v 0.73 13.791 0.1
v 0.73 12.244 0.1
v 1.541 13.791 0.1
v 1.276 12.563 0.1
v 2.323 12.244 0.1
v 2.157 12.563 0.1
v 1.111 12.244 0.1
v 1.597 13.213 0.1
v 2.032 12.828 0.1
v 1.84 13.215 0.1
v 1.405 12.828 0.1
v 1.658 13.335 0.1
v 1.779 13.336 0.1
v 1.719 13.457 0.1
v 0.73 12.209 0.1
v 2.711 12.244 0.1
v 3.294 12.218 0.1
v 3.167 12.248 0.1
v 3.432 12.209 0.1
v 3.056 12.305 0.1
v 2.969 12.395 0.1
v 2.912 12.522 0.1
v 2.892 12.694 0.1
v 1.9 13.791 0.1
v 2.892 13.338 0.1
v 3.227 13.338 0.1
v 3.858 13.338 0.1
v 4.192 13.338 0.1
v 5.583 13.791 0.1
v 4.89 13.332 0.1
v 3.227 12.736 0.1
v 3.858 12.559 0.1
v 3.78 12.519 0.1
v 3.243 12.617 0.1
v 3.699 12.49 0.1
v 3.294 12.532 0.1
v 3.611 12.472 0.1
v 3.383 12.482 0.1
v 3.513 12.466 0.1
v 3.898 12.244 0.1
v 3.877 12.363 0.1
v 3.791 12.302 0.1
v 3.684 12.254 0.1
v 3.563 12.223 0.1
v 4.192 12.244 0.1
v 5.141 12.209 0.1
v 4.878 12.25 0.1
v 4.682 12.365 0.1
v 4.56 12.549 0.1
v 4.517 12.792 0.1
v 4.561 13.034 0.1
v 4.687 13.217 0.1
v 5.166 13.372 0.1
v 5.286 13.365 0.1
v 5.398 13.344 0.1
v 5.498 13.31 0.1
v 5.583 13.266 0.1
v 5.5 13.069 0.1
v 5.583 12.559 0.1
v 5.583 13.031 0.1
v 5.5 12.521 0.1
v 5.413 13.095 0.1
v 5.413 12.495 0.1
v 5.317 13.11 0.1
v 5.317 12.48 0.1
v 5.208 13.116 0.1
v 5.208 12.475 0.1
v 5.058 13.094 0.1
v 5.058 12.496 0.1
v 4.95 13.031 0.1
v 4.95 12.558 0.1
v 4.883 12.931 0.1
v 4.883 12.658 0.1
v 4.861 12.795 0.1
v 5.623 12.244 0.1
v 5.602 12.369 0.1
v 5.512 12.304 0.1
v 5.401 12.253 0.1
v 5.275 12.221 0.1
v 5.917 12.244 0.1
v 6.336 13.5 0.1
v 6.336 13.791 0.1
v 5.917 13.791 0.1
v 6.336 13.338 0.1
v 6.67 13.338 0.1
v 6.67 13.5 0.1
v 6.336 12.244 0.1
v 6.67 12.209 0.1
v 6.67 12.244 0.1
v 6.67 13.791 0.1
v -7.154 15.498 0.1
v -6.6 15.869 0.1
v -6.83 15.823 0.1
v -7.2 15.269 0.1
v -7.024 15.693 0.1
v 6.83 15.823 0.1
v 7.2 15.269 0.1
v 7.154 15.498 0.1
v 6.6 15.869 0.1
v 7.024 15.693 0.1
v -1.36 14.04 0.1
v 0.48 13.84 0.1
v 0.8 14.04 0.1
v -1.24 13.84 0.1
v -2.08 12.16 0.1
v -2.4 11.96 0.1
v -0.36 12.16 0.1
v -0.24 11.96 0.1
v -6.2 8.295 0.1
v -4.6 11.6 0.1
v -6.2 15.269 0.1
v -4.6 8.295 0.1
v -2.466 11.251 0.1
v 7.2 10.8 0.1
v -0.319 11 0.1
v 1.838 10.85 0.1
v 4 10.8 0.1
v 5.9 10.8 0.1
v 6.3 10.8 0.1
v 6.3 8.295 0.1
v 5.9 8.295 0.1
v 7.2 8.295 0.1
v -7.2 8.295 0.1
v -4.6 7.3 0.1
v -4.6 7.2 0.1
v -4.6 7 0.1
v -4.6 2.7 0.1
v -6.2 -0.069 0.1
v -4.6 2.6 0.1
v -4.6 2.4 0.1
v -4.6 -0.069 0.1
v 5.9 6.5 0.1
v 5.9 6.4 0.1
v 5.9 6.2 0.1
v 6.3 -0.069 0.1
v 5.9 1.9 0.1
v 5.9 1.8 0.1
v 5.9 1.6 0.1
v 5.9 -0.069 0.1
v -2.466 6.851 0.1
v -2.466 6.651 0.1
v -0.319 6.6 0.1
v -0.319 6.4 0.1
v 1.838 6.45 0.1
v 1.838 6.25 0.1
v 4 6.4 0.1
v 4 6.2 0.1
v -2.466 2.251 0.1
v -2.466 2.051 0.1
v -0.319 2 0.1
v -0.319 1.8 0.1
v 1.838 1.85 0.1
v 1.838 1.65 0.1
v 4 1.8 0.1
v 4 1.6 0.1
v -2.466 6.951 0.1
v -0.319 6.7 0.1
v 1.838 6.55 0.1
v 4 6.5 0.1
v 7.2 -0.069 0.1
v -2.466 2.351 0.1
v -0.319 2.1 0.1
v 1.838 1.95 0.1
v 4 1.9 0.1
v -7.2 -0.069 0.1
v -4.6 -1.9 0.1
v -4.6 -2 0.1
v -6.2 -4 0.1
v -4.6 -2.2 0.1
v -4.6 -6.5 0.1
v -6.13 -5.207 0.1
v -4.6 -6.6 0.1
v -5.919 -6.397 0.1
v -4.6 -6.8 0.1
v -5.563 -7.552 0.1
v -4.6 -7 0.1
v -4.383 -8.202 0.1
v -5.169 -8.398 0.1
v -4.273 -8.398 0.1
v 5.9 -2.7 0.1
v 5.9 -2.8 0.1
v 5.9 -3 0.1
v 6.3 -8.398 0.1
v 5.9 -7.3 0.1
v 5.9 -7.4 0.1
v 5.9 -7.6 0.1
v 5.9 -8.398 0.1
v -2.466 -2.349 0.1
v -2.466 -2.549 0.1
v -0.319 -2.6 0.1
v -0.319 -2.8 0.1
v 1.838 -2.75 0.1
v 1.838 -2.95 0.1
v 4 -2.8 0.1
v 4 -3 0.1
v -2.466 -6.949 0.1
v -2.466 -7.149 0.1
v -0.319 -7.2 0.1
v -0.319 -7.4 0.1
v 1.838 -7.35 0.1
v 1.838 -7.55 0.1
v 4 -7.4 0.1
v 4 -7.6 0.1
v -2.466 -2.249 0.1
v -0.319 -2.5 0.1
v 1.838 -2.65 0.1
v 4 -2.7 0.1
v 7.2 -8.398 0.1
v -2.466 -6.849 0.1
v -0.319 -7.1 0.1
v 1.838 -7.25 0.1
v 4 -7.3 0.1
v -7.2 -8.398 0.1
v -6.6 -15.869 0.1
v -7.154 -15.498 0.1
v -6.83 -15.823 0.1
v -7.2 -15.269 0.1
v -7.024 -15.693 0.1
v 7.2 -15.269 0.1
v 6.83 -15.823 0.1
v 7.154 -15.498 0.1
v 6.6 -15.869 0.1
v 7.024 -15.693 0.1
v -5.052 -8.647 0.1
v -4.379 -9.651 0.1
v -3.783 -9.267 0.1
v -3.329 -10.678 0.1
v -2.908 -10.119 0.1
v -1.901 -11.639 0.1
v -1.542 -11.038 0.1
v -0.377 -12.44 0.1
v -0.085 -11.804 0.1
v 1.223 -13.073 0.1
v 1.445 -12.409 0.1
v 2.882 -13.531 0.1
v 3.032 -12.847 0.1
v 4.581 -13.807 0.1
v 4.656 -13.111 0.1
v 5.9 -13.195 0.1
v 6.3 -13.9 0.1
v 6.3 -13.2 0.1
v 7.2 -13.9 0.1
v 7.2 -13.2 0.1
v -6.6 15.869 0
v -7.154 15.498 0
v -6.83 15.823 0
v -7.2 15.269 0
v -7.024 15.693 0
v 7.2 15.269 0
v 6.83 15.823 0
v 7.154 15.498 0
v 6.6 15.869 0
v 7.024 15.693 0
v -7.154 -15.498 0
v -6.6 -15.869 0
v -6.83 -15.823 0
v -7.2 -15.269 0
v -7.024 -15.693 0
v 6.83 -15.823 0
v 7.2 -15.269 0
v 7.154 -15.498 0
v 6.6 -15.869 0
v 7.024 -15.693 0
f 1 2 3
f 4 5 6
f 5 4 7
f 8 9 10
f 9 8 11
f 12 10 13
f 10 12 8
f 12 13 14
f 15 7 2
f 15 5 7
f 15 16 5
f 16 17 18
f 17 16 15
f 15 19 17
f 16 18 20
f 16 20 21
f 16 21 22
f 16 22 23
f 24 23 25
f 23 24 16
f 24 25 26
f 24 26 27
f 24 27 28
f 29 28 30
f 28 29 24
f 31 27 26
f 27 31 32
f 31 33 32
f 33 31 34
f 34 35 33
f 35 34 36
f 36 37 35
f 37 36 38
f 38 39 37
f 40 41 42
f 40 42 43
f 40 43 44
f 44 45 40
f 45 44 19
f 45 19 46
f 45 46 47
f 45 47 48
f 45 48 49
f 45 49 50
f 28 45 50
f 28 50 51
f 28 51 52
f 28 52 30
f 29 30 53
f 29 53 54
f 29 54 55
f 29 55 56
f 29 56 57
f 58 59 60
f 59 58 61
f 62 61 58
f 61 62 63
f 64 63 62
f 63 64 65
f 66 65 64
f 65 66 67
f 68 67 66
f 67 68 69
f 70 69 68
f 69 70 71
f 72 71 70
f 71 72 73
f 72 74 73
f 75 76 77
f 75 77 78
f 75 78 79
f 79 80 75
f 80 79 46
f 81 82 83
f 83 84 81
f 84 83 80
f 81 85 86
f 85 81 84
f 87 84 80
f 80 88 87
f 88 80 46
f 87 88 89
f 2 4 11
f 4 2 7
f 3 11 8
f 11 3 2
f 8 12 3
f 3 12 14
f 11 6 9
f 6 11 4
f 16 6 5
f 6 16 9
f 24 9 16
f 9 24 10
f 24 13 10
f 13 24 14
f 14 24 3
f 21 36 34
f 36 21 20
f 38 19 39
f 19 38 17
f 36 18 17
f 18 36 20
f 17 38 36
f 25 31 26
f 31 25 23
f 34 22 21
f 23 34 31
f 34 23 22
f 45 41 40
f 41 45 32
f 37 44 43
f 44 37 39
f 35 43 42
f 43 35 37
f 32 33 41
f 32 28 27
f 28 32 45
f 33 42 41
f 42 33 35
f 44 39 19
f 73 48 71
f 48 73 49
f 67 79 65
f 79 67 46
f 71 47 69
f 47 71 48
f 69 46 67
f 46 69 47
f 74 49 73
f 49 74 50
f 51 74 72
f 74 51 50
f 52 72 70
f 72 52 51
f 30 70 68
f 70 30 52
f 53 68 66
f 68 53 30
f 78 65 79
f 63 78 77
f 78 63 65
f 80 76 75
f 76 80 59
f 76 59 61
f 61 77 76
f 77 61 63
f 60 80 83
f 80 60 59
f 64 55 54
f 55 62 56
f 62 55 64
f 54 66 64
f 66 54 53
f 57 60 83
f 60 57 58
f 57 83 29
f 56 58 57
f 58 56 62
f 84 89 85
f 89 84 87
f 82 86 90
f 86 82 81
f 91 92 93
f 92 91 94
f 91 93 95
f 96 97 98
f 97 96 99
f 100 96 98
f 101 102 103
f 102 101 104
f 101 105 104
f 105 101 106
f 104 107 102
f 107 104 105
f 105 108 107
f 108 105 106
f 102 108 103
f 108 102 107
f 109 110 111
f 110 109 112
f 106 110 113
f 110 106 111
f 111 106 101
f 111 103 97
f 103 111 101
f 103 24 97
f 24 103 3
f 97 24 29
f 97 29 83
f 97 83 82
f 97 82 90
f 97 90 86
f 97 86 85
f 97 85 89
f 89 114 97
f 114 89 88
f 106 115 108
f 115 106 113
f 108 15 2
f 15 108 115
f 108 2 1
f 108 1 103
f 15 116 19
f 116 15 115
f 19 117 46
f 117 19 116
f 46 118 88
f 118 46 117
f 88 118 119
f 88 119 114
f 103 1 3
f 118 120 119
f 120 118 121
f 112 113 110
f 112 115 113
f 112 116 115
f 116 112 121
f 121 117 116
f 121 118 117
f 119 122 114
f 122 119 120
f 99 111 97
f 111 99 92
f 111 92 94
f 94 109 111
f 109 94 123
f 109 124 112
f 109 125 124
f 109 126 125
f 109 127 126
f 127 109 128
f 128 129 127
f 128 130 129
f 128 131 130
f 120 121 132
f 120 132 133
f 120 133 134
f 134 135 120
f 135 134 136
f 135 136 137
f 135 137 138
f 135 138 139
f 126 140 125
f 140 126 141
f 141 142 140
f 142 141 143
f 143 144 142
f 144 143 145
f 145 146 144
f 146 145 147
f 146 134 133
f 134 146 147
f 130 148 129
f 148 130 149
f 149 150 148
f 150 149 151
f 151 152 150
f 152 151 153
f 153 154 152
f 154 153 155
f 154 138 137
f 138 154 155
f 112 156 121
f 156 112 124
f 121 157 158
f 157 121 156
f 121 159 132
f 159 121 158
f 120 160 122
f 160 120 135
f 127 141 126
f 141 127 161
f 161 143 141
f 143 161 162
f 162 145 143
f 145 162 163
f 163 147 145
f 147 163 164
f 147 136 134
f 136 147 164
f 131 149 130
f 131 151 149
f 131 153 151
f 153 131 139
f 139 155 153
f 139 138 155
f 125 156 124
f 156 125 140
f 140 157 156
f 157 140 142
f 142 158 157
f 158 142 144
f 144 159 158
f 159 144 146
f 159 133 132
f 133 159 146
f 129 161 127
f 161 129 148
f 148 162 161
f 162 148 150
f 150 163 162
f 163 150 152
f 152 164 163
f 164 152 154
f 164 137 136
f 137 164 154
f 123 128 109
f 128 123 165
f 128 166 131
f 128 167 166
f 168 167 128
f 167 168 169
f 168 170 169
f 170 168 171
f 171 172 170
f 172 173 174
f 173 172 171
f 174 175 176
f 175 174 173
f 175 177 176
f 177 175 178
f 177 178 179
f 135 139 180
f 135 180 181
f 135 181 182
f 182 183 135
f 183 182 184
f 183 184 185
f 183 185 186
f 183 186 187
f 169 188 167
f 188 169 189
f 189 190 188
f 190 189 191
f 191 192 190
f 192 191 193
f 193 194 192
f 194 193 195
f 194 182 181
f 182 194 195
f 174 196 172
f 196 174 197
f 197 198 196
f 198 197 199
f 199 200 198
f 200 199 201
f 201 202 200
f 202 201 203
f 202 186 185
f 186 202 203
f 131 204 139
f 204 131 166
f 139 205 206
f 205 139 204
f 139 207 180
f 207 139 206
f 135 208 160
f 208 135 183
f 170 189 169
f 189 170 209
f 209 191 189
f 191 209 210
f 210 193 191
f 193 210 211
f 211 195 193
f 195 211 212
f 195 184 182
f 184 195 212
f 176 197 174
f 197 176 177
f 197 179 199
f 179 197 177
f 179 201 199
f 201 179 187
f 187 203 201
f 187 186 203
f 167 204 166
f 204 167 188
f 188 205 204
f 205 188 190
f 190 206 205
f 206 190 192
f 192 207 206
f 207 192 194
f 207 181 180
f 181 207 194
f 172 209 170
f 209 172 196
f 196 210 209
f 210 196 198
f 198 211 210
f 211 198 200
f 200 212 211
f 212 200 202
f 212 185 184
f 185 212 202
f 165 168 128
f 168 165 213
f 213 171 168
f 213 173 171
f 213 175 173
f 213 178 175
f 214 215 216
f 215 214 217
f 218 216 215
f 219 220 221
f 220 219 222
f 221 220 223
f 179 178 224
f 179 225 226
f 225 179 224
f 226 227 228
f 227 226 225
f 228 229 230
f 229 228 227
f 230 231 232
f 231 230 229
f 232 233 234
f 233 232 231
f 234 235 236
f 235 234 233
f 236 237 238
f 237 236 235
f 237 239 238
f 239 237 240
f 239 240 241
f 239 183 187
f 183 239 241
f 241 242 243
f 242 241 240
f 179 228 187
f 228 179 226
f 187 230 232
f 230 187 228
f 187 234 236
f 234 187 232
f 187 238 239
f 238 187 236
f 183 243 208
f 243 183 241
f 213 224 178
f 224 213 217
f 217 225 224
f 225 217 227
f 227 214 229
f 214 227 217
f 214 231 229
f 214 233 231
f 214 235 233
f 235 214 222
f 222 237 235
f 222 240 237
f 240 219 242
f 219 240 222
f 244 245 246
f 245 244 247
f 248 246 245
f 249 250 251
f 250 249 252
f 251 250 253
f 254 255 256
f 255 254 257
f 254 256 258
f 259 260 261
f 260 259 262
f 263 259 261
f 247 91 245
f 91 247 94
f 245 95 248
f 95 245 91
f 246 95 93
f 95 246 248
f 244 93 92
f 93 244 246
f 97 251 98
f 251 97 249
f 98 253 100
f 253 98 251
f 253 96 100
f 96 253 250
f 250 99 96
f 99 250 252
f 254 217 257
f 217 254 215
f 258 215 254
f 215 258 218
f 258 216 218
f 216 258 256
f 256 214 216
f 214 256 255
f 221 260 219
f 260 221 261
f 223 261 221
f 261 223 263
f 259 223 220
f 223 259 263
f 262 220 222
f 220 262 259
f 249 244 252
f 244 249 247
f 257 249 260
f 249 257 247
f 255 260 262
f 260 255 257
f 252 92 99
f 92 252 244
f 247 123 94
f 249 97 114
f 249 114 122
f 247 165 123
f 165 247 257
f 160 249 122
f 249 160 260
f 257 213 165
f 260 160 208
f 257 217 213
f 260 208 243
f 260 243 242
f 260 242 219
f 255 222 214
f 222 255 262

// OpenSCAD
// file: ../p/1-4cyli.scad
use <../lib.scad>
function ldraw_lib__1_4cyli() = [
// 0 Cylinder 0.25
// 0 Name: 1-4cyli.dat
// 0 Author: James Jessiman
// 0 !LDRAW_ORG Primitive UPDATE 2012-01
// 0 !LICENSE Licensed under CC BY 4.0 : see CAreadme.txt
// 
// 0 BFC CERTIFY CCW
  [0,"BFC","CERTIFY"],
  [0,"BFC","CCW"],
// 
// 0 !HISTORY 2002-03-23 [sbliss] Added BFC statement.
// 0 !HISTORY 2002-04-25 [PTadmin] Official Update 2002-02
// 0 !HISTORY 2007-06-22 [PTadmin] Header formatted for Contributor Agreement
// 0 !HISTORY 2008-07-01 [PTadmin] Official Update 2008-01
// 0 !HISTORY 2012-02-16 [Philo] Changed to CCW
// 0 !HISTORY 2012-03-30 [PTadmin] Official Update 2012-01
// 
// 
// 4 16 1 1 0 0.9239 1 0.3827 0.9239 0 0.3827 1 0 0
  [4,16,1,1,0,0.9239,1,0.3827,0.9239,0,0.3827,1,0,0],
// 5 24 1 0 0 1 1 0 0.9239 0 0.3827 1 0 -1
  [5,24,1,0,0,1,1,0,0.9239,0,0.3827,1,0,-1],
// 4 16 0.9239 1 0.3827 0.7071 1 0.7071 0.7071 0 0.7071 0.9239 0 0.3827
  [4,16,0.9239,1,0.3827,0.7071,1,0.7071,0.7071,0,0.7071,0.9239,0,0.3827],
// 5 24 0.9239 0 0.3827 0.9239 1 0.3827 0.7071 0 0.7071 1 0 0
  [5,24,0.9239,0,0.3827,0.9239,1,0.3827,0.7071,0,0.7071,1,0,0],
// 4 16 0.7071 1 0.7071 0.3827 1 0.9239 0.3827 0 0.9239 0.7071 0 0.7071
  [4,16,0.7071,1,0.7071,0.3827,1,0.9239,0.3827,0,0.9239,0.7071,0,0.7071],
// 5 24 0.7071 0 0.7071 0.7071 1 0.7071 0.3827 0 0.9239 0.9239 0 0.3827
  [5,24,0.7071,0,0.7071,0.7071,1,0.7071,0.3827,0,0.9239,0.9239,0,0.3827],
// 4 16 0.3827 1 0.9239 0 1 1 0 0 1 0.3827 0 0.9239
  [4,16,0.3827,1,0.9239,0,1,1,0,0,1,0.3827,0,0.9239],
// 5 24 0.3827 0 0.9239 0.3827 1 0.9239 0 0 1 0.7071 0 0.7071
  [5,24,0.3827,0,0.9239,0.3827,1,0.9239,0,0,1,0.7071,0,0.7071],
// 5 24 0 0 1 0 1 1 0.3827 0 0.9239 -1 0 1
  [5,24,0,0,1,0,1,1,0.3827,0,0.9239,-1,0,1],
];
module ldraw_lib__1_4cyli(step=0, col=false, unit=2/5, alt=false, line=0.2, solid=!$preview)
    makepoly(ldraw_lib__1_4cyli(), step=step, col=col, unit=unit, alt=alt, line=line, solid=solid);
ldraw_lib__1_4cyli(line=0.2);
// file: ../p/logo-audi-text.scad
use <../lib.scad>
function ldraw_lib__logo_audi_text() = [
// 0 Logo Audi Text
// 0 Name: logo-audi-text.dat
// 0 Author: Massimo Maso [Sirio]
// 0 !LDRAW_ORG Primitive UPDATE 2024-01
// 0 !LICENSE Licensed under CC BY 4.0 : see CAreadme.txt
// 
// 0 !HELP Exact dimensions X = 29.703; Z = 7.906
// 0 !HELP Produced by txt2dat, Copyright 2005-2007, 2009 R. Crawford
// 0 !HELP Using font: "Audi Type" style: "Extended Bold" size: 12pt
// 
// 0 BFC CERTIFY CCW
  [0,"BFC","CERTIFY"],
  [0,"BFC","CCW"],
// 
// 0 !HISTORY 2024-01-29 [OrionP] Official Update 2024-01
// 
// 
// 0 // Letter "A"
// 4 16 -12.9445 0 -3.781 -12.1195 0 -2.187 -11.4775 0 -.859 -14.8515 0 -3.781
  [4,16,-12.9445,0,-3.781,-12.1195,0,-2.187,-11.4775,0,-.859,-14.8515,0,-3.781],
// 4 16 -14.8515 0 -3.781 -11.4775 0 -.859 -10.5165 0 1.064 -10.7925 0 3.953
  [4,16,-14.8515,0,-3.781,-11.4775,0,-.859,-10.5165,0,1.064,-10.7925,0,3.953],
// 3 16 -10.5165 0 1.064 -10.2115 0 1.674 -10.7925 0 3.953
  [3,16,-10.5165,0,1.064,-10.2115,0,1.674,-10.7925,0,3.953],
// 3 16 -10.7925 0 3.953 -10.2115 0 1.674 -9.9055 0 2.287
  [3,16,-10.7925,0,3.953,-10.2115,0,1.674,-9.9055,0,2.287],
// 4 16 -8.3405 0 -.859 -11.4775 0 -.859 -12.1195 0 -2.187 -7.7145 0 -2.187
  [4,16,-8.3405,0,-.859,-11.4775,0,-.859,-12.1195,0,-2.187,-7.7145,0,-2.187],
// 4 16 -8.3405 0 -.859 -7.7145 0 -2.187 -6.8825 0 -3.781 -4.9445 0 -3.781
  [4,16,-8.3405,0,-.859,-7.7145,0,-2.187,-6.8825,0,-3.781,-4.9445,0,-3.781],
// 4 16 -9.3005 0 1.074 -8.3405 0 -.859 -4.9445 0 -3.781 -8.9995 0 3.953
  [4,16,-9.3005,0,1.074,-8.3405,0,-.859,-4.9445,0,-3.781,-8.9995,0,3.953],
// 4 16 -9.9055 0 2.287 -9.6045 0 1.679 -9.3005 0 1.074 -8.9995 0 3.953
  [4,16,-9.9055,0,2.287,-9.6045,0,1.679,-9.3005,0,1.074,-8.9995,0,3.953],
// 3 16 -9.9055 0 2.287 -8.9995 0 3.953 -10.7925 0 3.953
  [3,16,-9.9055,0,2.287,-8.9995,0,3.953,-10.7925,0,3.953],
// 0 // Letter "u"
// 4 16 -2.2855 0 -1.917 -3.6545 0 -3.026 -3.2205 0 -3.473 -2.0315 0 -2.34
  [4,16,-2.2855,0,-1.917,-3.6545,0,-3.026,-3.2205,0,-3.473,-2.0315,0,-2.34],
// 4 16 -.9325 0 -2.672 -1.5855 0 -2.59 -2.0305 0 -3.909 -1.3385 0 -3.953
  [4,16,-.9325,0,-2.672,-1.5855,0,-2.59,-2.0305,0,-3.909,-1.3385,0,-3.953],
// 4 16 -3.2205 0 -3.473 -2.6675 0 -3.758 -2.0305 0 -3.909 -2.0315 0 -2.34
  [4,16,-3.2205,0,-3.473,-2.6675,0,-3.758,-2.0305,0,-3.909,-2.0315,0,-2.34],
// 3 16 -2.0305 0 -3.909 -1.5855 0 -2.59 -2.0315 0 -2.34
  [3,16,-2.0305,0,-3.909,-1.5855,0,-2.59,-2.0315,0,-2.34],
// 4 16 -2.3665 0 1.688 -4.0385 0 1.688 -4.0385 0 -1.532 -2.3665 0 -1.319
  [4,16,-2.3665,0,1.688,-4.0385,0,1.688,-4.0385,0,-1.532,-2.3665,0,-1.319],
// 3 16 -2.2855 0 -1.917 -3.9375 0 -2.388 -3.6545 0 -3.026
  [3,16,-2.2855,0,-1.917,-3.9375,0,-2.388,-3.6545,0,-3.026],
// 4 16 -3.9375 0 -2.388 -2.2855 0 -1.917 -2.3665 0 -1.319 -4.0385 0 -1.532
  [4,16,-3.9375,0,-2.388,-2.2855,0,-1.917,-2.3665,0,-1.319,-4.0385,0,-1.532],
// 4 16 .9925 0 -3.781 2.4615 0 -3.781 .7895 0 -2.203 .8835 0 -3.187
  [4,16,.9925,0,-3.781,2.4615,0,-3.781,.7895,0,-2.203,.8835,0,-3.187],
// 4 16 -.0785 0 -3.729 -.4465 0 -2.641 -.9325 0 -2.672 -.6865 0 -3.887
  [4,16,-.0785,0,-3.729,-.4465,0,-2.641,-.9325,0,-2.672,-.6865,0,-3.887],
// 4 16 .4535 0 -3.492 -.0065 0 -2.552 -.4465 0 -2.641 -.0785 0 -3.729
  [4,16,.4535,0,-3.492,-.0065,0,-2.552,-.4465,0,-2.641,-.0785,0,-3.729],
// 3 16 .7895 0 -2.203 .4005 0 -2.405 .8835 0 -3.187
  [3,16,.7895,0,-2.203,.4005,0,-2.405,.8835,0,-3.187],
// 4 16 .7895 0 1.688 .7895 0 -2.203 2.4615 0 -3.781 2.4615 0 1.688
  [4,16,.7895,0,1.688,.7895,0,-2.203,2.4615,0,-3.781,2.4615,0,1.688],
// 4 16 .8835 0 -3.187 .4005 0 -2.405 -.0065 0 -2.552 .4535 0 -3.492
  [4,16,.8835,0,-3.187,.4005,0,-2.405,-.0065,0,-2.552,.4535,0,-3.492],
// 3 16 -.6865 0 -3.887 -.9325 0 -2.672 -1.3385 0 -3.953
  [3,16,-.6865,0,-3.887,-.9325,0,-2.672,-1.3385,0,-3.953],
// 0 // Letter "d"
// 4 16 6.2485 0 -2.21 5.9165 0 -1.709 4.2985 0 -2.257 4.9125 0 -3.173
  [4,16,6.2485,0,-2.21,5.9165,0,-1.709,4.2985,0,-2.257,4.9125,0,-3.173],
// 4 16 8.0865 0 -2.6 7.5395 0 -2.625 7.2025 0 -3.953 7.8775 0 -3.895
  [4,16,8.0865,0,-2.6,7.5395,0,-2.625,7.2025,0,-3.953,7.8775,0,-3.895],
// 4 16 4.9125 0 -3.173 5.8915 0 -3.751 6.7915 0 -2.52 6.2485 0 -2.21
  [4,16,4.9125,0,-3.173,5.8915,0,-3.751,6.7915,0,-2.52,6.2485,0,-2.21],
// 4 16 7.5395 0 -2.625 6.7915 0 -2.52 5.8915 0 -3.751 7.2025 0 -3.953
  [4,16,7.5395,0,-2.625,6.7915,0,-2.52,5.8915,0,-3.751,7.2025,0,-3.953],
// 4 16 5.9165 0 -1.709 5.8055 0 -1.027 4.0865 0 -1.04 4.2985 0 -2.257
  [4,16,5.9165,0,-1.709,5.8055,0,-1.027,4.0865,0,-1.04,4.2985,0,-2.257],
// 4 16 4.0865 0 -1.04 5.8055 0 -1.027 5.9165 0 -.346 4.3025 0 .171
  [4,16,4.0865,0,-1.04,5.8055,0,-1.027,5.9165,0,-.346,4.3025,0,.171],
// 4 16 4.3025 0 .171 5.9165 0 -.346 6.2485 0 .157 4.9335 0 1.084
  [4,16,4.3025,0,.171,5.9165,0,-.346,6.2485,0,.157,4.9335,0,1.084],
// 4 16 4.9335 0 1.084 6.2485 0 .157 6.7915 0 .47 5.9515 0 1.659
  [4,16,4.9335,0,1.084,6.2485,0,.157,6.7915,0,.47,5.9515,0,1.659],
// 4 16 5.9515 0 1.659 6.7915 0 .47 7.5395 0 .578 7.3315 0 1.86
  [4,16,5.9515,0,1.659,6.7915,0,.47,7.5395,0,.578,7.3315,0,1.86],
// 3 16 8.5065 0 -3.733 8.0865 0 -2.6 7.8775 0 -3.895
  [3,16,8.5065,0,-3.733,8.0865,0,-2.6,7.8775,0,-3.895],
// 4 16 8.0865 0 -2.6 8.5065 0 -3.733 9.0595 0 -3.481 8.5645 0 -2.524
  [4,16,8.0865,0,-2.6,8.5065,0,-3.733,9.0595,0,-3.481,8.5645,0,-2.524],
// 4 16 9.4145 0 -2.203 9.5085 0 -3.156 9.6175 0 -3.781 11.0865 0 -3.781
  [4,16,9.4145,0,-2.203,9.5085,0,-3.156,9.6175,0,-3.781,11.0865,0,-3.781],
// 3 16 9.5085 0 -3.156 9.4145 0 -2.203 8.9985 0 -2.393
  [3,16,9.5085,0,-3.156,9.4145,0,-2.203,8.9985,0,-2.393],
// 4 16 8.5645 0 -2.524 9.0595 0 -3.481 9.5085 0 -3.156 8.9985 0 -2.393
  [4,16,8.5645,0,-2.524,9.0595,0,-3.481,9.5085,0,-3.156,8.9985,0,-2.393],
// 4 16 11.0865 0 3.953 9.4145 0 .157 9.4145 0 -2.203 11.0865 0 -3.781
  [4,16,11.0865,0,3.953,9.4145,0,.157,9.4145,0,-2.203,11.0865,0,-3.781],
// 3 16 8.0865 0 .552 8.4905 0 1.718 7.9295 0 1.823
  [3,16,8.0865,0,.552,8.4905,0,1.718,7.9295,0,1.823],
// 4 16 8.0865 0 .552 8.5645 0 .474 8.9925 0 1.551 8.4905 0 1.718
  [4,16,8.0865,0,.552,8.5645,0,.474,8.9925,0,1.551,8.4905,0,1.718],
// 4 16 7.3315 0 1.86 7.5395 0 .578 8.0865 0 .552 7.9295 0 1.823
  [4,16,7.3315,0,1.86,7.5395,0,.578,8.0865,0,.552,7.9295,0,1.823],
// 4 16 11.0865 0 3.953 9.4145 0 1.328 8.9985 0 .343 9.4145 0 .157
  [4,16,11.0865,0,3.953,9.4145,0,1.328,8.9985,0,.343,9.4145,0,.157],
// 3 16 9.4145 0 1.328 11.0865 0 3.953 9.4145 0 3.953
  [3,16,9.4145,0,1.328,11.0865,0,3.953,9.4145,0,3.953],
// 4 16 8.9925 0 1.551 8.5645 0 .474 8.9985 0 .343 9.4145 0 1.328
  [4,16,8.9925,0,1.551,8.5645,0,.474,8.9985,0,.343,9.4145,0,1.328],
// 0 // Letter "i"
// 4 16 13.1805 0 -3.781 14.8515 0 -3.781 14.8515 0 1.688 13.1805 0 1.688
  [4,16,13.1805,0,-3.781,14.8515,0,-3.781,14.8515,0,1.688,13.1805,0,1.688],
// 4 16 13.1805 0 2.5 14.8515 0 2.5 14.8515 0 3.953 13.1805 0 3.953
  [4,16,13.1805,0,2.5,14.8515,0,2.5,14.8515,0,3.953,13.1805,0,3.953],
];
module ldraw_lib__logo_audi_text(step=0, col=false, unit=2/5, alt=false, line=0.2, solid=!$preview)
    makepoly(ldraw_lib__logo_audi_text(), step=step, col=col, unit=unit, alt=alt, line=line, solid=solid);
ldraw_lib__logo_audi_text(line=0.2);
// file: ../p/1-4chrd.scad
use <../lib.scad>
function ldraw_lib__1_4chrd() = [
// 0 Chord 0.25
// 0 Name: 1-4chrd.dat
// 0 Author: Max Martin Richter [MMR1988]
// 0 !LDRAW_ORG Primitive UPDATE 2023-05
// 0 !LICENSE Licensed under CC BY 4.0 : see CAreadme.txt
// 
// 0 BFC CERTIFY CCW
  [0,"BFC","CERTIFY"],
  [0,"BFC","CCW"],
// 
// 0 !HISTORY 2004-04-22 [PTadmin] Official Update 2004-02
// 0 !HISTORY 2007-10-09 [PTadmin] Header formatted for Contributor Agreement
// 0 !HISTORY 2008-07-01 [PTadmin] Official Update 2008-01
// 0 !HISTORY 2012-08-02 [MMR1988] Re-creation with PrimGen2 and Rectifier
// 0 !HISTORY 2012-08-09 [PTadmin] Official Update 2012-02
// 0 !HISTORY 2023-10-27 [OrionP] Change author to MMR1988 from hafhead
// 0 !HISTORY 2023-10-31 [OrionP] Official Update 2023-05
// 
// 4 16 0.9239 0 0.3827 0.3827 0 0.9239 0 0 1 1 0 0
  [4,16,0.9239,0,0.3827,0.3827,0,0.9239,0,0,1,1,0,0],
// 3 16 0.7071 0 0.7071 0.3827 0 0.9239 0.9239 0 0.3827
  [3,16,0.7071,0,0.7071,0.3827,0,0.9239,0.9239,0,0.3827],
];
module ldraw_lib__1_4chrd(step=0, col=false, unit=2/5, alt=false, line=0.2, solid=!$preview)
    makepoly(ldraw_lib__1_4chrd(), step=step, col=col, unit=unit, alt=alt, line=line, solid=solid);
ldraw_lib__1_4chrd(line=0.2);
// file: s/6142271as05.scad
use <../../lib.scad>
use <../../p/1-4chrd.scad>
use <../../p/1-4cyli.scad>
function ldraw_lib__s__6142271as05() = [
// 0 ~Sticker  1.8 x  4 with Dark Grey Rear Windshield with Black Air Vents and White Audi Logo on White Face - Bottom Face
// 0 Name: s\6142271as05.dat
// 0 Author: Massimo Maso [Sirio]
// 0 !LDRAW_ORG Subpart UPDATE 2025-02
// 0 !LICENSE Licensed under CC BY 4.0 : see CAreadme.txt
// 
// 0 BFC CERTIFY CCW
  [0,"BFC","CERTIFY"],
  [0,"BFC","CCW"],
// 
// 0 !HISTORY 2025-02-27 [OrionP] Official Update 2025-02
// 
// 
// 0 // Primitives
// 1 16 -16.5 0 38.1717 -1.5 0 0 0 -1 0 0 0 1.5 1-4chrd.dat
  [1,16,-16.5,0,38.1717,-1.5,0,0,0,-1,0,0,0,1.5, ldraw_lib__1_4chrd()],
// 1 16 16.5 0 38.1717 1.5 0 0 0 -1 0 0 0 1.5 1-4chrd.dat
  [1,16,16.5,0,38.1717,1.5,0,0,0,-1,0,0,0,1.5, ldraw_lib__1_4chrd()],
// 1 16 -16.5 0 -38.1717 -1.5 0 0 0 -1 0 0 0 -1.5 1-4chrd.dat
  [1,16,-16.5,0,-38.1717,-1.5,0,0,0,-1,0,0,0,-1.5, ldraw_lib__1_4chrd()],
// 1 16 16.5 0 -38.1717 1.5 0 0 0 -1 0 0 0 -1.5 1-4chrd.dat
  [1,16,16.5,0,-38.1717,1.5,0,0,0,-1,0,0,0,-1.5, ldraw_lib__1_4chrd()],
// 1 16 -16.5 -0.25 38.1717 -1.5 0 0 0 0.25 0 0 0 1.5 1-4cyli.dat
  [1,16,-16.5,-0.25,38.1717,-1.5,0,0,0,0.25,0,0,0,1.5, ldraw_lib__1_4cyli()],
// 1 16 16.5 -0.25 38.1717 1.5 0 0 0 0.25 0 0 0 1.5 1-4cyli.dat
  [1,16,16.5,-0.25,38.1717,1.5,0,0,0,0.25,0,0,0,1.5, ldraw_lib__1_4cyli()],
// 1 16 -16.5 -0.25 -38.1717 -1.5 0 0 0 0.25 0 0 0 -1.5 1-4cyli.dat
  [1,16,-16.5,-0.25,-38.1717,-1.5,0,0,0,0.25,0,0,0,-1.5, ldraw_lib__1_4cyli()],
// 1 16 16.5 -0.25 -38.1717 1.5 0 0 0 0.25 0 0 0 -1.5 1-4cyli.dat
  [1,16,16.5,-0.25,-38.1717,1.5,0,0,0,0.25,0,0,0,-1.5, ldraw_lib__1_4cyli()],
// 0 // Bottom face
// 4 16 16.5 0 39.6717 18 0 38.1717 -18 0 38.1717 -16.5 0 39.6717
  [4,16,16.5,0,39.6717,18,0,38.1717,-18,0,38.1717,-16.5,0,39.6717],
// 4 16 18 0 38.1717 18 0 -38.1717 -18 0 -38.1717 -18 0 38.1717
  [4,16,18,0,38.1717,18,0,-38.1717,-18,0,-38.1717,-18,0,38.1717],
// 4 16 -18 0 -38.1717 18 0 -38.1717 16.5 0 -39.6717 -16.5 0 -39.6717
  [4,16,-18,0,-38.1717,18,0,-38.1717,16.5,0,-39.6717,-16.5,0,-39.6717],
// 0 // Lateral faces
// 4 16 16.5 0 39.6717 -16.5 0 39.6717 -16.5 -.25 39.6717 16.5 -.25 39.6717
  [4,16,16.5,0,39.6717,-16.5,0,39.6717,-16.5,-.25,39.6717,16.5,-.25,39.6717],
// 3 16 -18 0 38.1717 -18 -.25 20.737 -18 -.25 38.1717
  [3,16,-18,0,38.1717,-18,-.25,20.737,-18,-.25,38.1717],
// 3 16 18 0 38.1717 18 -.25 38.1717 18 -.25 27
  [3,16,18,0,38.1717,18,-.25,38.1717,18,-.25,27],
// 3 16 18 0 38.1717 18 -.25 27 18 -.25 20.737
  [3,16,18,0,38.1717,18,-.25,27,18,-.25,20.737],
// 4 16 -18 0 38.1717 -18 0 -38.1717 -18 -.25 -.1714 -18 -.25 20.737
  [4,16,-18,0,38.1717,-18,0,-38.1717,-18,-.25,-.1714,-18,-.25,20.737],
// 4 16 18 0 38.1717 18 -.25 20.737 18 -.25 -.1714 18 0 -38.1717
  [4,16,18,0,38.1717,18,-.25,20.737,18,-.25,-.1714,18,0,-38.1717],
// 3 16 -18 0 -38.1717 -18 -.25 -20.994 -18 -.25 -.1714
  [3,16,-18,0,-38.1717,-18,-.25,-20.994,-18,-.25,-.1714],
// 3 16 18 0 -38.1717 18 -.25 -.1714 18 -.25 -20.994
  [3,16,18,0,-38.1717,18,-.25,-.1714,18,-.25,-20.994],
// 3 16 -18 0 -38.1717 -18 -.25 -38.1717 -18 -.25 -20.994
  [3,16,-18,0,-38.1717,-18,-.25,-38.1717,-18,-.25,-20.994],
// 3 16 18 0 -38.1717 18 -.25 -20.994 18 -.25 -33
  [3,16,18,0,-38.1717,18,-.25,-20.994,18,-.25,-33],
// 3 16 18 0 -38.1717 18 -.25 -33 18 -.25 -34.75
  [3,16,18,0,-38.1717,18,-.25,-33,18,-.25,-34.75],
// 3 16 18 0 -38.1717 18 -.25 -34.75 18 -.25 -38.1717
  [3,16,18,0,-38.1717,18,-.25,-34.75,18,-.25,-38.1717],
// 4 16 16.5 0 -39.6717 16.5 -.25 -39.6717 -16.5 -.25 -39.6717 -16.5 0 -39.6717
  [4,16,16.5,0,-39.6717,16.5,-.25,-39.6717,-16.5,-.25,-39.6717,-16.5,0,-39.6717],
];
module ldraw_lib__s__6142271as05(step=0, col=false, unit=2/5, alt=false, line=0.2, solid=!$preview)
    makepoly(ldraw_lib__s__6142271as05(), step=step, col=col, unit=unit, alt=alt, line=line, solid=solid);
ldraw_lib__s__6142271as05(line=0.2);
// file: s/6142271as04.scad
use <../../lib.scad>
use <../../p/1-4chrd.scad>
function ldraw_lib__s__6142271as04() = [
// 0 ~Sticker  1.8 x  4 with Dark Grey Rear Windshield with Black Air Vents and White Audi Logo on White Face - Fourth Face
// 0 Name: s\6142271as04.dat
// 0 Author: Massimo Maso [Sirio]
// 0 !LDRAW_ORG Subpart UPDATE 2025-02
// 0 !LICENSE Licensed under CC BY 4.0 : see CAreadme.txt
// 
// 0 BFC CERTIFY CCW
  [0,"BFC","CERTIFY"],
  [0,"BFC","CCW"],
// 
// 0 !HISTORY 2025-02-27 [OrionP] Official Update 2025-02
// 
// 
// 0 // Primitives
// 1 15 -16.5 -.25 -17.162 -1.5 0 0 0 1 0 0 0 -1.5 1-4chrd.dat
  [1,15,-16.5,-.25,-17.162,-1.5,0,0,0,1,0,0,0,-1.5, ldraw_lib__1_4chrd()],
// 1 15 16.5 -.25 -17.162 1.5 0 0 0 1 0 0 0 -1.5 1-4chrd.dat
  [1,15,16.5,-.25,-17.162,1.5,0,0,0,1,0,0,0,-1.5, ldraw_lib__1_4chrd()],
// 0 // Black faces
// 3 0 -10.6826 -.25 .0157 -12.9214 -.25 .0157 -12.6307 -.25 -.6084
  [3,0,-10.6826,-.25,.0157,-12.9214,-.25,.0157,-12.6307,-.25,-.6084],
// 4 0 -10.6826 -.25 .0157 -12.6307 -.25 -.6084 -10.9471 -.25 -3.1175 -9.4581 -.25 -2.1574
  [4,0,-10.6826,-.25,.0157,-12.6307,-.25,-.6084,-10.9471,-.25,-3.1175,-9.4581,-.25,-2.1574],
// 4 0 -7.2694 -.25 -4.2881 -9.4581 -.25 -2.1574 -10.9471 -.25 -3.1175 -8.3226 -.25 -5.6857
  [4,0,-7.2694,-.25,-4.2881,-9.4581,-.25,-2.1574,-10.9471,-.25,-3.1175,-8.3226,-.25,-5.6857],
// 4 0 -7.2694 -.25 -4.2881 -8.3226 -.25 -5.6857 -4.7517 -.25 -8.0868 -3.8548 -.25 -6.5841
  [4,0,-7.2694,-.25,-4.2881,-8.3226,-.25,-5.6857,-4.7517,-.25,-8.0868,-3.8548,-.25,-6.5841],
// 4 0 -.2132 -.25 -8.5 -3.8548 -.25 -6.5841 -4.7517 -.25 -8.0868 -.9435 -.25 -10.0903
  [4,0,-.2132,-.25,-8.5,-3.8548,-.25,-6.5841,-4.7517,-.25,-8.0868,-.9435,-.25,-10.0903],
// 4 0 -.2132 -.25 -8.5 -.9435 -.25 -10.0903 3.0578 -.25 -11.6732 3.6131 -.25 -10.0137
  [4,0,-.2132,-.25,-8.5,-.9435,-.25,-10.0903,3.0578,-.25,-11.6732,3.6131,-.25,-10.0137],
// 4 0 7.5798 -.25 -11.1075 3.6131 -.25 -10.0137 3.0578 -.25 -11.6732 7.206 -.25 -12.8172
  [4,0,7.5798,-.25,-11.1075,3.6131,-.25,-10.0137,3.0578,-.25,-11.6732,7.206,-.25,-12.8172],
// 4 0 7.5798 -.25 -11.1075 7.206 -.25 -12.8172 11.4532 -.25 -13.5088 11.6411 -.25 -11.769
  [4,0,7.5798,-.25,-11.1075,7.206,-.25,-12.8172,11.4532,-.25,-13.5088,11.6411,-.25,-11.769],
// 4 0 14.75 -.25 -11.9772 11.6411 -.25 -11.769 11.4532 -.25 -13.5088 15.75 -.25 -13.7403
  [4,0,14.75,-.25,-11.9772,11.6411,-.25,-11.769,11.4532,-.25,-13.5088,15.75,-.25,-13.7403],
// 3 0 14.75 -.25 -11.9772 15.75 -.25 -13.7403 15.75 -.25 -11.9903
  [3,0,14.75,-.25,-11.9772,15.75,-.25,-13.7403,15.75,-.25,-11.9903],
// 4 0 14.75 -.25 -11.9772 15.75 -.25 -11.9903 15.75 -.25 .0157 14.75 -.25 .0157
  [4,0,14.75,-.25,-11.9772,15.75,-.25,-11.9903,15.75,-.25,.0157,14.75,-.25,.0157],
// 4 0 18 -.25 -11.9903 15.75 -.25 -11.9903 15.75 -.25 -13.7403 18 -.25 -13.7403
  [4,0,18,-.25,-11.9903,15.75,-.25,-11.9903,15.75,-.25,-13.7403,18,-.25,-13.7403],
// 0 // Dark grey faces
// 4 72 14.75 -.25 .0157 -10.6826 -.25 .0157 -9.4581 -.25 -2.1574 -7.2694 -.25 -4.2881
  [4,72,14.75,-.25,.0157,-10.6826,-.25,.0157,-9.4581,-.25,-2.1574,-7.2694,-.25,-4.2881],
// 4 72 14.75 -.25 .0157 -7.2694 -.25 -4.2881 -3.8548 -.25 -6.5841 -.2132 -.25 -8.5
  [4,72,14.75,-.25,.0157,-7.2694,-.25,-4.2881,-3.8548,-.25,-6.5841,-.2132,-.25,-8.5],
// 4 72 14.75 -.25 .0157 -.2132 -.25 -8.5 3.6131 -.25 -10.0137 7.5798 -.25 -11.1075
  [4,72,14.75,-.25,.0157,-.2132,-.25,-8.5,3.6131,-.25,-10.0137,7.5798,-.25,-11.1075],
// 4 72 14.75 -.25 .0157 7.5798 -.25 -11.1075 11.6411 -.25 -11.769 14.75 -.25 -11.9772
  [4,72,14.75,-.25,.0157,7.5798,-.25,-11.1075,11.6411,-.25,-11.769,14.75,-.25,-11.9772],
// 4 72 18 -.25 .0157 15.75 -.25 .0157 15.75 -.25 -11.9903 18 -.25 -11.9903
  [4,72,18,-.25,.0157,15.75,-.25,.0157,15.75,-.25,-11.9903,18,-.25,-11.9903],
// 0 // White faces
// 4 15 -18 -.25 -17.162 -12.6307 -.25 -.6084 -12.9214 -.25 .0157 -18 -.25 .0157
  [4,15,-18,-.25,-17.162,-12.6307,-.25,-.6084,-12.9214,-.25,.0157,-18,-.25,.0157],
// 3 15 -18 -.25 -17.162 -10.9471 -.25 -3.1175 -12.6307 -.25 -.6084
  [3,15,-18,-.25,-17.162,-10.9471,-.25,-3.1175,-12.6307,-.25,-.6084],
// 3 15 -10.9471 -.25 -3.1175 -18 -.25 -17.162 -8.3226 -.25 -5.6857
  [3,15,-10.9471,-.25,-3.1175,-18,-.25,-17.162,-8.3226,-.25,-5.6857],
// 4 15 -16.5 -.25 -18.662 -4.7517 -.25 -8.0868 -8.3226 -.25 -5.6857 -18 -.25 -17.162
  [4,15,-16.5,-.25,-18.662,-4.7517,-.25,-8.0868,-8.3226,-.25,-5.6857,-18,-.25,-17.162],
// 3 15 -16.5 -.25 -18.662 -.9435 -.25 -10.0903 -4.7517 -.25 -8.0868
  [3,15,-16.5,-.25,-18.662,-.9435,-.25,-10.0903,-4.7517,-.25,-8.0868],
// 3 15 -16.5 -.25 -18.662 3.0578 -.25 -11.6732 -.9435 -.25 -10.0903
  [3,15,-16.5,-.25,-18.662,3.0578,-.25,-11.6732,-.9435,-.25,-10.0903],
// 4 15 -16.5 -.25 -18.662 16.5 -.25 -18.662 7.206 -.25 -12.8172 3.0578 -.25 -11.6732
  [4,15,-16.5,-.25,-18.662,16.5,-.25,-18.662,7.206,-.25,-12.8172,3.0578,-.25,-11.6732],
// 3 15 16.5 -.25 -18.662 11.4532 -.25 -13.5088 7.206 -.25 -12.8172
  [3,15,16.5,-.25,-18.662,11.4532,-.25,-13.5088,7.206,-.25,-12.8172],
// 3 15 16.5 -.25 -18.662 15.75 -.25 -13.7403 11.4532 -.25 -13.5088
  [3,15,16.5,-.25,-18.662,15.75,-.25,-13.7403,11.4532,-.25,-13.5088],
// 4 15 16.5 -.25 -18.662 18 -.25 -17.162 18 -.25 -13.7403 15.75 -.25 -13.7403
  [4,15,16.5,-.25,-18.662,18,-.25,-17.162,18,-.25,-13.7403,15.75,-.25,-13.7403],
];
module ldraw_lib__s__6142271as04(step=0, col=false, unit=2/5, alt=false, line=0.2, solid=!$preview)
    makepoly(ldraw_lib__s__6142271as04(), step=step, col=col, unit=unit, alt=alt, line=line, solid=solid);
ldraw_lib__s__6142271as04(line=0.2);
// file: s/6142271as01.scad
use <../../lib.scad>
use <../../p/1-4chrd.scad>
use <../../p/logo-audi-text-box.scad>
use <../../p/logo-audi-text.scad>
function ldraw_lib__s__6142271as01() = [
// 0 ~Sticker  1.8 x  4 with Dark Grey Rear Windshield with Black Air Vents and White Audi Logo on White Face - First Face
// 0 Name: s\6142271as01.dat
// 0 Author: Massimo Maso [Sirio]
// 0 !LDRAW_ORG Subpart UPDATE 2025-02
// 0 !LICENSE Licensed under CC BY 4.0 : see CAreadme.txt
// 
// 0 BFC CERTIFY CCW
  [0,"BFC","CERTIFY"],
  [0,"BFC","CCW"],
// 
// 0 !HISTORY 2025-02-27 [OrionP] Official Update 2025-02
// 
// 
// 0 // Subparts
// 1 0 9.25 -.25 11.7477 .5 0 0 0 1 0 0 0 .5 logo-audi-text-box.dat
  [1,0,9.25,-.25,11.7477,.5,0,0,0,1,0,0,0,.5, ldraw_lib__logo_audi_text_box()],
// 1 15 9.25 -.25 11.7477 .5 0 0 0 1 0 0 0 .5 logo-audi-text.dat
  [1,15,9.25,-.25,11.7477,.5,0,0,0,1,0,0,0,.5, ldraw_lib__logo_audi_text()],
// 0 // Primitives
// 1 15 -16.5 -.25 17.4194 -1.5 0 0 0 1 0 0 0 1.5 1-4chrd.dat
  [1,15,-16.5,-.25,17.4194,-1.5,0,0,0,1,0,0,0,1.5, ldraw_lib__1_4chrd()],
// 1 15 16.5 -.25 17.4194 1.5 0 0 0 1 0 0 0 1.5 1-4chrd.dat
  [1,15,16.5,-.25,17.4194,1.5,0,0,0,1,0,0,0,1.5, ldraw_lib__1_4chrd()],
// 0 // Logo
// 4 15 -3.1 -.25 13.8477 1.2 -.25 13.8477 2 -.25 14.3477 -3.4 -.25 14.3477
  [4,15,-3.1,-.25,13.8477,1.2,-.25,13.8477,2,-.25,14.3477,-3.4,-.25,14.3477],
// 4 15 -3.1 -.25 13.8477 -3.4 -.25 14.3477 -6 -.25 9.1477 -5.2 -.25 9.6477
  [4,15,-3.1,-.25,13.8477,-3.4,-.25,14.3477,-6,-.25,9.1477,-5.2,-.25,9.6477],
// 4 4 -3.1 -.25 13.8477 -5.2 -.25 9.6477 -.9 -.25 9.6477 1.2 -.25 13.8477
  [4,4,-3.1,-.25,13.8477,-5.2,-.25,9.6477,-.9,-.25,9.6477,1.2,-.25,13.8477],
// 4 15 -.9 -.25 9.6477 -5.2 -.25 9.6477 -6 -.25 9.1477 -.6 -.25 9.1477
  [4,15,-.9,-.25,9.6477,-5.2,-.25,9.6477,-6,-.25,9.1477,-.6,-.25,9.1477],
// 4 15 -.9 -.25 9.6477 -.6 -.25 9.1477 2 -.25 14.3477 1.2 -.25 13.8477
  [4,15,-.9,-.25,9.6477,-.6,-.25,9.1477,2,-.25,14.3477,1.2,-.25,13.8477],
// 0 // Black faces
// 4 0 -15.5 -.25 17.4194 -15.5 -.25 -.0153 -11.5 -.25 -.0153 -11.5 -.25 8.2477
  [4,0,-15.5,-.25,17.4194,-15.5,-.25,-.0153,-11.5,-.25,-.0153,-11.5,-.25,8.2477],
// 4 0 -15.5 -.25 17.4194 -11.5 -.25 8.2477 -6.1656 -.25 7.3741 -6 -.25 9.1477
  [4,0,-15.5,-.25,17.4194,-11.5,-.25,8.2477,-6.1656,-.25,7.3741,-6,-.25,9.1477],
// 3 0 -15.5 -.25 17.4194 -6 -.25 9.1477 -3.4 -.25 14.3477
  [3,0,-15.5,-.25,17.4194,-6,-.25,9.1477,-3.4,-.25,14.3477],
// 4 0 -15.5 -.25 17.4194 -3.4 -.25 14.3477 2 -.25 14.3477 18 -.25 17.4194
  [4,0,-15.5,-.25,17.4194,-3.4,-.25,14.3477,2,-.25,14.3477,18,-.25,17.4194],
// 4 0 18 -.25 17.4194 2 -.25 14.3477 3.85375 -.25 13.7242 4.75025 -.25 13.7242
  [4,0,18,-.25,17.4194,2,-.25,14.3477,3.85375,-.25,13.7242,4.75025,-.25,13.7242],
// 3 0 18 -.25 17.4194 4.75025 -.25 13.7242 13.95725 -.25 13.7242
  [3,0,18,-.25,17.4194,4.75025,-.25,13.7242,13.95725,-.25,13.7242],
// 3 0 18 -.25 17.4194 13.95725 -.25 13.7242 14.79325 -.25 13.7242
  [3,0,18,-.25,17.4194,13.95725,-.25,13.7242,14.79325,-.25,13.7242],
// 3 0 18 -.25 17.4194 14.79325 -.25 13.7242 15.84025 -.25 13.7242
  [3,0,18,-.25,17.4194,14.79325,-.25,13.7242,15.84025,-.25,13.7242],
// 3 0 18 -.25 17.4194 15.84025 -.25 13.7242 16.67575 -.25 13.7242
  [3,0,18,-.25,17.4194,15.84025,-.25,13.7242,16.67575,-.25,13.7242],
// 3 0 18 -.25 17.4194 16.67575 -.25 13.7242 16.67575 -.25 12.9977
  [3,0,18,-.25,17.4194,16.67575,-.25,13.7242,16.67575,-.25,12.9977],
// 3 0 18 -.25 17.4194 16.67575 -.25 12.9977 16.67575 -.25 12.5917
  [3,0,18,-.25,17.4194,16.67575,-.25,12.9977,16.67575,-.25,12.5917],
// 3 0 18 -.25 17.4194 16.67575 -.25 12.5917 16.67575 -.25 9.8572
  [3,0,18,-.25,17.4194,16.67575,-.25,12.5917,16.67575,-.25,9.8572],
// 4 0 18 -.25 17.4194 16.67575 -.25 9.8572 16.67575 -.25 9.7712 18 -.25 6.2477
  [4,0,18,-.25,17.4194,16.67575,-.25,9.8572,16.67575,-.25,9.7712,18,-.25,6.2477],
// 4 0 -.6 -.25 9.1477 -6 -.25 9.1477 -6.1656 -.25 7.3741 -.7964 -.25 6.7488
  [4,0,-.6,-.25,9.1477,-6,-.25,9.1477,-6.1656,-.25,7.3741,-.7964,-.25,6.7488],
// 4 0 -.6 -.25 9.1477 -.7964 -.25 6.7488 1.82425 -.25 9.7712 1.82425 -.25 9.8572
  [4,0,-.6,-.25,9.1477,-.7964,-.25,6.7488,1.82425,-.25,9.7712,1.82425,-.25,9.8572],
// 3 0 -.6 -.25 9.1477 1.82425 -.25 9.8572 1.82425 -.25 13.7242
  [3,0,-.6,-.25,9.1477,1.82425,-.25,9.8572,1.82425,-.25,13.7242],
// 3 0 -.6 -.25 9.1477 1.82425 -.25 13.7242 2 -.25 14.3477
  [3,0,-.6,-.25,9.1477,1.82425,-.25,13.7242,2,-.25,14.3477],
// 4 0 8.58075 -.25 9.7712 1.82425 -.25 9.7712 -.7964 -.25 6.7488 4.596 -.25 6.373
  [4,0,8.58075,-.25,9.7712,1.82425,-.25,9.7712,-.7964,-.25,6.7488,4.596,-.25,6.373],
// 4 0 8.58075 -.25 9.7712 4.596 -.25 6.373 10 -.25 6.2477 12.85125 -.25 9.7712
  [4,0,8.58075,-.25,9.7712,4.596,-.25,6.373,10,-.25,6.2477,12.85125,-.25,9.7712],
// 4 0 16.67575 -.25 9.7712 12.85125 -.25 9.7712 10 -.25 6.2477 14.75 -.25 6.2477
  [4,0,16.67575,-.25,9.7712,12.85125,-.25,9.7712,10,-.25,6.2477,14.75,-.25,6.2477],
// 3 0 16.67575 -.25 9.7712 14.75 -.25 6.2477 15.75 -.25 6.2477
  [3,0,16.67575,-.25,9.7712,14.75,-.25,6.2477,15.75,-.25,6.2477],
// 3 0 16.67575 -.25 9.7712 15.75 -.25 6.2477 18 -.25 6.2477
  [3,0,16.67575,-.25,9.7712,15.75,-.25,6.2477,18,-.25,6.2477],
// 3 0 2 -.25 14.3477 1.82425 -.25 13.7242 3.85375 -.25 13.7242
  [3,0,2,-.25,14.3477,1.82425,-.25,13.7242,3.85375,-.25,13.7242],
// 4 0 14.75 -.25 -.0153 15.75 -.25 -.0153 15.75 -.25 6.2477 14.75 -.25 6.2477
  [4,0,14.75,-.25,-.0153,15.75,-.25,-.0153,15.75,-.25,6.2477,14.75,-.25,6.2477],
// 0 // Dark grey faces
// 3 72 -11.5 -.25 -.0153 -6.1656 -.25 7.3741 -11.5 -.25 8.2477
  [3,72,-11.5,-.25,-.0153,-6.1656,-.25,7.3741,-11.5,-.25,8.2477],
// 3 72 -11.5 -.25 -.0153 -.7964 -.25 6.7488 -6.1656 -.25 7.3741
  [3,72,-11.5,-.25,-.0153,-.7964,-.25,6.7488,-6.1656,-.25,7.3741],
// 4 72 -11.5 -.25 -.0153 14.75 -.25 -.0153 4.596 -.25 6.373 -.7964 -.25 6.7488
  [4,72,-11.5,-.25,-.0153,14.75,-.25,-.0153,4.596,-.25,6.373,-.7964,-.25,6.7488],
// 3 72 14.75 -.25 -.0153 10 -.25 6.2477 4.596 -.25 6.373
  [3,72,14.75,-.25,-.0153,10,-.25,6.2477,4.596,-.25,6.373],
// 3 72 14.75 -.25 -.0153 14.75 -.25 6.2477 10 -.25 6.2477
  [3,72,14.75,-.25,-.0153,14.75,-.25,6.2477,10,-.25,6.2477],
// 4 72 18 -.25 -.0153 18 -.25 6.2477 15.75 -.25 6.2477 15.75 -.25 -.0153
  [4,72,18,-.25,-.0153,18,-.25,6.2477,15.75,-.25,6.2477,15.75,-.25,-.0153],
// 0 // White faces
// 4 15 -15.5 -.25 17.4194 18 -.25 17.4194 16.5 -.25 18.9194 -16.5 -.25 18.9194
  [4,15,-15.5,-.25,17.4194,18,-.25,17.4194,16.5,-.25,18.9194,-16.5,-.25,18.9194],
// 3 15 -15.5 -.25 17.4194 -16.5 -.25 18.9194 -18 -.25 17.4194
  [3,15,-15.5,-.25,17.4194,-16.5,-.25,18.9194,-18,-.25,17.4194],
// 4 15 -15.5 -.25 17.4194 -18 -.25 17.4194 -18 -.25 -.0153 -15.5 -.25 -.0153
  [4,15,-15.5,-.25,17.4194,-18,-.25,17.4194,-18,-.25,-.0153,-15.5,-.25,-.0153],
];
module ldraw_lib__s__6142271as01(step=0, col=false, unit=2/5, alt=false, line=0.2, solid=!$preview)
    makepoly(ldraw_lib__s__6142271as01(), step=step, col=col, unit=unit, alt=alt, line=line, solid=solid);
ldraw_lib__s__6142271as01(line=0.2);
// main file
use <../lib.scad>
use <s/6142271as01.scad>
use <s/6142271as02.scad>
use <s/6142271as03.scad>
use <s/6142271as04.scad>
use <s/6142271as05.scad>
function ldraw_lib__6142271a() = [
// 0 Sticker  1.8 x  4 with Dark Grey Rear Windshield with Black Air Vents and White Audi Logo on White Face
// 0 Name: 6142271a.dat
// 0 Author: Massimo Maso [Sirio]
// 0 !LDRAW_ORG Part UPDATE 2025-02
// 0 !LICENSE Licensed under CC BY 4.0 : see CAreadme.txt
// 
// 0 BFC CERTIFY CCW
  [0,"BFC","CERTIFY"],
  [0,"BFC","CCW"],
// 
// 0 !KEYWORDS Bricklink 75873stk01a, Brickowl 427960, LMS, R8, Rebrickable 24755
// 0 !KEYWORDS Set 75873, Speed Champions, Ultra
// 
// 0 !HISTORY 2025-02-27 [OrionP] Official Update 2025-02
// 
// 
// 1 16 0 0 20.7523 1 0 0 0 1 0 0 0 1 s\6142271as01.dat
  [1,16,0,0,20.7523,1,0,0,0,1,0,0,0,1, ldraw_lib__s__6142271as01()],
// 1 16 0 0 20.7217 1 0 0 0 1 0 0 0 1 s\6142271as02.dat
  [1,16,0,0,20.7217,1,0,0,0,1,0,0,0,1, ldraw_lib__s__6142271as02()],
// 1 16 0 0 -20.9783 1 0 0 0 1 0 0 0 1 s\6142271as03.dat
  [1,16,0,0,-20.9783,1,0,0,0,1,0,0,0,1, ldraw_lib__s__6142271as03()],
// 1 16 0 0 -21.0097 1 0 0 0 1 0 0 0 1 s\6142271as04.dat
  [1,16,0,0,-21.0097,1,0,0,0,1,0,0,0,1, ldraw_lib__s__6142271as04()],
// 1 16 0 0 0 1 0 0 0 1 0 0 0 1 s\6142271as05.dat
  [1,16,0,0,0,1,0,0,0,1,0,0,0,1, ldraw_lib__s__6142271as05()],
];
module ldraw_lib__6142271a(step=0, col=false, unit=2/5, alt=false, line=0.2, solid=!$preview)
    makepoly(ldraw_lib__6142271a(), step=step, col=col, unit=unit, alt=alt, line=line, solid=solid);
ldraw_lib__6142271a(line=0.2);
